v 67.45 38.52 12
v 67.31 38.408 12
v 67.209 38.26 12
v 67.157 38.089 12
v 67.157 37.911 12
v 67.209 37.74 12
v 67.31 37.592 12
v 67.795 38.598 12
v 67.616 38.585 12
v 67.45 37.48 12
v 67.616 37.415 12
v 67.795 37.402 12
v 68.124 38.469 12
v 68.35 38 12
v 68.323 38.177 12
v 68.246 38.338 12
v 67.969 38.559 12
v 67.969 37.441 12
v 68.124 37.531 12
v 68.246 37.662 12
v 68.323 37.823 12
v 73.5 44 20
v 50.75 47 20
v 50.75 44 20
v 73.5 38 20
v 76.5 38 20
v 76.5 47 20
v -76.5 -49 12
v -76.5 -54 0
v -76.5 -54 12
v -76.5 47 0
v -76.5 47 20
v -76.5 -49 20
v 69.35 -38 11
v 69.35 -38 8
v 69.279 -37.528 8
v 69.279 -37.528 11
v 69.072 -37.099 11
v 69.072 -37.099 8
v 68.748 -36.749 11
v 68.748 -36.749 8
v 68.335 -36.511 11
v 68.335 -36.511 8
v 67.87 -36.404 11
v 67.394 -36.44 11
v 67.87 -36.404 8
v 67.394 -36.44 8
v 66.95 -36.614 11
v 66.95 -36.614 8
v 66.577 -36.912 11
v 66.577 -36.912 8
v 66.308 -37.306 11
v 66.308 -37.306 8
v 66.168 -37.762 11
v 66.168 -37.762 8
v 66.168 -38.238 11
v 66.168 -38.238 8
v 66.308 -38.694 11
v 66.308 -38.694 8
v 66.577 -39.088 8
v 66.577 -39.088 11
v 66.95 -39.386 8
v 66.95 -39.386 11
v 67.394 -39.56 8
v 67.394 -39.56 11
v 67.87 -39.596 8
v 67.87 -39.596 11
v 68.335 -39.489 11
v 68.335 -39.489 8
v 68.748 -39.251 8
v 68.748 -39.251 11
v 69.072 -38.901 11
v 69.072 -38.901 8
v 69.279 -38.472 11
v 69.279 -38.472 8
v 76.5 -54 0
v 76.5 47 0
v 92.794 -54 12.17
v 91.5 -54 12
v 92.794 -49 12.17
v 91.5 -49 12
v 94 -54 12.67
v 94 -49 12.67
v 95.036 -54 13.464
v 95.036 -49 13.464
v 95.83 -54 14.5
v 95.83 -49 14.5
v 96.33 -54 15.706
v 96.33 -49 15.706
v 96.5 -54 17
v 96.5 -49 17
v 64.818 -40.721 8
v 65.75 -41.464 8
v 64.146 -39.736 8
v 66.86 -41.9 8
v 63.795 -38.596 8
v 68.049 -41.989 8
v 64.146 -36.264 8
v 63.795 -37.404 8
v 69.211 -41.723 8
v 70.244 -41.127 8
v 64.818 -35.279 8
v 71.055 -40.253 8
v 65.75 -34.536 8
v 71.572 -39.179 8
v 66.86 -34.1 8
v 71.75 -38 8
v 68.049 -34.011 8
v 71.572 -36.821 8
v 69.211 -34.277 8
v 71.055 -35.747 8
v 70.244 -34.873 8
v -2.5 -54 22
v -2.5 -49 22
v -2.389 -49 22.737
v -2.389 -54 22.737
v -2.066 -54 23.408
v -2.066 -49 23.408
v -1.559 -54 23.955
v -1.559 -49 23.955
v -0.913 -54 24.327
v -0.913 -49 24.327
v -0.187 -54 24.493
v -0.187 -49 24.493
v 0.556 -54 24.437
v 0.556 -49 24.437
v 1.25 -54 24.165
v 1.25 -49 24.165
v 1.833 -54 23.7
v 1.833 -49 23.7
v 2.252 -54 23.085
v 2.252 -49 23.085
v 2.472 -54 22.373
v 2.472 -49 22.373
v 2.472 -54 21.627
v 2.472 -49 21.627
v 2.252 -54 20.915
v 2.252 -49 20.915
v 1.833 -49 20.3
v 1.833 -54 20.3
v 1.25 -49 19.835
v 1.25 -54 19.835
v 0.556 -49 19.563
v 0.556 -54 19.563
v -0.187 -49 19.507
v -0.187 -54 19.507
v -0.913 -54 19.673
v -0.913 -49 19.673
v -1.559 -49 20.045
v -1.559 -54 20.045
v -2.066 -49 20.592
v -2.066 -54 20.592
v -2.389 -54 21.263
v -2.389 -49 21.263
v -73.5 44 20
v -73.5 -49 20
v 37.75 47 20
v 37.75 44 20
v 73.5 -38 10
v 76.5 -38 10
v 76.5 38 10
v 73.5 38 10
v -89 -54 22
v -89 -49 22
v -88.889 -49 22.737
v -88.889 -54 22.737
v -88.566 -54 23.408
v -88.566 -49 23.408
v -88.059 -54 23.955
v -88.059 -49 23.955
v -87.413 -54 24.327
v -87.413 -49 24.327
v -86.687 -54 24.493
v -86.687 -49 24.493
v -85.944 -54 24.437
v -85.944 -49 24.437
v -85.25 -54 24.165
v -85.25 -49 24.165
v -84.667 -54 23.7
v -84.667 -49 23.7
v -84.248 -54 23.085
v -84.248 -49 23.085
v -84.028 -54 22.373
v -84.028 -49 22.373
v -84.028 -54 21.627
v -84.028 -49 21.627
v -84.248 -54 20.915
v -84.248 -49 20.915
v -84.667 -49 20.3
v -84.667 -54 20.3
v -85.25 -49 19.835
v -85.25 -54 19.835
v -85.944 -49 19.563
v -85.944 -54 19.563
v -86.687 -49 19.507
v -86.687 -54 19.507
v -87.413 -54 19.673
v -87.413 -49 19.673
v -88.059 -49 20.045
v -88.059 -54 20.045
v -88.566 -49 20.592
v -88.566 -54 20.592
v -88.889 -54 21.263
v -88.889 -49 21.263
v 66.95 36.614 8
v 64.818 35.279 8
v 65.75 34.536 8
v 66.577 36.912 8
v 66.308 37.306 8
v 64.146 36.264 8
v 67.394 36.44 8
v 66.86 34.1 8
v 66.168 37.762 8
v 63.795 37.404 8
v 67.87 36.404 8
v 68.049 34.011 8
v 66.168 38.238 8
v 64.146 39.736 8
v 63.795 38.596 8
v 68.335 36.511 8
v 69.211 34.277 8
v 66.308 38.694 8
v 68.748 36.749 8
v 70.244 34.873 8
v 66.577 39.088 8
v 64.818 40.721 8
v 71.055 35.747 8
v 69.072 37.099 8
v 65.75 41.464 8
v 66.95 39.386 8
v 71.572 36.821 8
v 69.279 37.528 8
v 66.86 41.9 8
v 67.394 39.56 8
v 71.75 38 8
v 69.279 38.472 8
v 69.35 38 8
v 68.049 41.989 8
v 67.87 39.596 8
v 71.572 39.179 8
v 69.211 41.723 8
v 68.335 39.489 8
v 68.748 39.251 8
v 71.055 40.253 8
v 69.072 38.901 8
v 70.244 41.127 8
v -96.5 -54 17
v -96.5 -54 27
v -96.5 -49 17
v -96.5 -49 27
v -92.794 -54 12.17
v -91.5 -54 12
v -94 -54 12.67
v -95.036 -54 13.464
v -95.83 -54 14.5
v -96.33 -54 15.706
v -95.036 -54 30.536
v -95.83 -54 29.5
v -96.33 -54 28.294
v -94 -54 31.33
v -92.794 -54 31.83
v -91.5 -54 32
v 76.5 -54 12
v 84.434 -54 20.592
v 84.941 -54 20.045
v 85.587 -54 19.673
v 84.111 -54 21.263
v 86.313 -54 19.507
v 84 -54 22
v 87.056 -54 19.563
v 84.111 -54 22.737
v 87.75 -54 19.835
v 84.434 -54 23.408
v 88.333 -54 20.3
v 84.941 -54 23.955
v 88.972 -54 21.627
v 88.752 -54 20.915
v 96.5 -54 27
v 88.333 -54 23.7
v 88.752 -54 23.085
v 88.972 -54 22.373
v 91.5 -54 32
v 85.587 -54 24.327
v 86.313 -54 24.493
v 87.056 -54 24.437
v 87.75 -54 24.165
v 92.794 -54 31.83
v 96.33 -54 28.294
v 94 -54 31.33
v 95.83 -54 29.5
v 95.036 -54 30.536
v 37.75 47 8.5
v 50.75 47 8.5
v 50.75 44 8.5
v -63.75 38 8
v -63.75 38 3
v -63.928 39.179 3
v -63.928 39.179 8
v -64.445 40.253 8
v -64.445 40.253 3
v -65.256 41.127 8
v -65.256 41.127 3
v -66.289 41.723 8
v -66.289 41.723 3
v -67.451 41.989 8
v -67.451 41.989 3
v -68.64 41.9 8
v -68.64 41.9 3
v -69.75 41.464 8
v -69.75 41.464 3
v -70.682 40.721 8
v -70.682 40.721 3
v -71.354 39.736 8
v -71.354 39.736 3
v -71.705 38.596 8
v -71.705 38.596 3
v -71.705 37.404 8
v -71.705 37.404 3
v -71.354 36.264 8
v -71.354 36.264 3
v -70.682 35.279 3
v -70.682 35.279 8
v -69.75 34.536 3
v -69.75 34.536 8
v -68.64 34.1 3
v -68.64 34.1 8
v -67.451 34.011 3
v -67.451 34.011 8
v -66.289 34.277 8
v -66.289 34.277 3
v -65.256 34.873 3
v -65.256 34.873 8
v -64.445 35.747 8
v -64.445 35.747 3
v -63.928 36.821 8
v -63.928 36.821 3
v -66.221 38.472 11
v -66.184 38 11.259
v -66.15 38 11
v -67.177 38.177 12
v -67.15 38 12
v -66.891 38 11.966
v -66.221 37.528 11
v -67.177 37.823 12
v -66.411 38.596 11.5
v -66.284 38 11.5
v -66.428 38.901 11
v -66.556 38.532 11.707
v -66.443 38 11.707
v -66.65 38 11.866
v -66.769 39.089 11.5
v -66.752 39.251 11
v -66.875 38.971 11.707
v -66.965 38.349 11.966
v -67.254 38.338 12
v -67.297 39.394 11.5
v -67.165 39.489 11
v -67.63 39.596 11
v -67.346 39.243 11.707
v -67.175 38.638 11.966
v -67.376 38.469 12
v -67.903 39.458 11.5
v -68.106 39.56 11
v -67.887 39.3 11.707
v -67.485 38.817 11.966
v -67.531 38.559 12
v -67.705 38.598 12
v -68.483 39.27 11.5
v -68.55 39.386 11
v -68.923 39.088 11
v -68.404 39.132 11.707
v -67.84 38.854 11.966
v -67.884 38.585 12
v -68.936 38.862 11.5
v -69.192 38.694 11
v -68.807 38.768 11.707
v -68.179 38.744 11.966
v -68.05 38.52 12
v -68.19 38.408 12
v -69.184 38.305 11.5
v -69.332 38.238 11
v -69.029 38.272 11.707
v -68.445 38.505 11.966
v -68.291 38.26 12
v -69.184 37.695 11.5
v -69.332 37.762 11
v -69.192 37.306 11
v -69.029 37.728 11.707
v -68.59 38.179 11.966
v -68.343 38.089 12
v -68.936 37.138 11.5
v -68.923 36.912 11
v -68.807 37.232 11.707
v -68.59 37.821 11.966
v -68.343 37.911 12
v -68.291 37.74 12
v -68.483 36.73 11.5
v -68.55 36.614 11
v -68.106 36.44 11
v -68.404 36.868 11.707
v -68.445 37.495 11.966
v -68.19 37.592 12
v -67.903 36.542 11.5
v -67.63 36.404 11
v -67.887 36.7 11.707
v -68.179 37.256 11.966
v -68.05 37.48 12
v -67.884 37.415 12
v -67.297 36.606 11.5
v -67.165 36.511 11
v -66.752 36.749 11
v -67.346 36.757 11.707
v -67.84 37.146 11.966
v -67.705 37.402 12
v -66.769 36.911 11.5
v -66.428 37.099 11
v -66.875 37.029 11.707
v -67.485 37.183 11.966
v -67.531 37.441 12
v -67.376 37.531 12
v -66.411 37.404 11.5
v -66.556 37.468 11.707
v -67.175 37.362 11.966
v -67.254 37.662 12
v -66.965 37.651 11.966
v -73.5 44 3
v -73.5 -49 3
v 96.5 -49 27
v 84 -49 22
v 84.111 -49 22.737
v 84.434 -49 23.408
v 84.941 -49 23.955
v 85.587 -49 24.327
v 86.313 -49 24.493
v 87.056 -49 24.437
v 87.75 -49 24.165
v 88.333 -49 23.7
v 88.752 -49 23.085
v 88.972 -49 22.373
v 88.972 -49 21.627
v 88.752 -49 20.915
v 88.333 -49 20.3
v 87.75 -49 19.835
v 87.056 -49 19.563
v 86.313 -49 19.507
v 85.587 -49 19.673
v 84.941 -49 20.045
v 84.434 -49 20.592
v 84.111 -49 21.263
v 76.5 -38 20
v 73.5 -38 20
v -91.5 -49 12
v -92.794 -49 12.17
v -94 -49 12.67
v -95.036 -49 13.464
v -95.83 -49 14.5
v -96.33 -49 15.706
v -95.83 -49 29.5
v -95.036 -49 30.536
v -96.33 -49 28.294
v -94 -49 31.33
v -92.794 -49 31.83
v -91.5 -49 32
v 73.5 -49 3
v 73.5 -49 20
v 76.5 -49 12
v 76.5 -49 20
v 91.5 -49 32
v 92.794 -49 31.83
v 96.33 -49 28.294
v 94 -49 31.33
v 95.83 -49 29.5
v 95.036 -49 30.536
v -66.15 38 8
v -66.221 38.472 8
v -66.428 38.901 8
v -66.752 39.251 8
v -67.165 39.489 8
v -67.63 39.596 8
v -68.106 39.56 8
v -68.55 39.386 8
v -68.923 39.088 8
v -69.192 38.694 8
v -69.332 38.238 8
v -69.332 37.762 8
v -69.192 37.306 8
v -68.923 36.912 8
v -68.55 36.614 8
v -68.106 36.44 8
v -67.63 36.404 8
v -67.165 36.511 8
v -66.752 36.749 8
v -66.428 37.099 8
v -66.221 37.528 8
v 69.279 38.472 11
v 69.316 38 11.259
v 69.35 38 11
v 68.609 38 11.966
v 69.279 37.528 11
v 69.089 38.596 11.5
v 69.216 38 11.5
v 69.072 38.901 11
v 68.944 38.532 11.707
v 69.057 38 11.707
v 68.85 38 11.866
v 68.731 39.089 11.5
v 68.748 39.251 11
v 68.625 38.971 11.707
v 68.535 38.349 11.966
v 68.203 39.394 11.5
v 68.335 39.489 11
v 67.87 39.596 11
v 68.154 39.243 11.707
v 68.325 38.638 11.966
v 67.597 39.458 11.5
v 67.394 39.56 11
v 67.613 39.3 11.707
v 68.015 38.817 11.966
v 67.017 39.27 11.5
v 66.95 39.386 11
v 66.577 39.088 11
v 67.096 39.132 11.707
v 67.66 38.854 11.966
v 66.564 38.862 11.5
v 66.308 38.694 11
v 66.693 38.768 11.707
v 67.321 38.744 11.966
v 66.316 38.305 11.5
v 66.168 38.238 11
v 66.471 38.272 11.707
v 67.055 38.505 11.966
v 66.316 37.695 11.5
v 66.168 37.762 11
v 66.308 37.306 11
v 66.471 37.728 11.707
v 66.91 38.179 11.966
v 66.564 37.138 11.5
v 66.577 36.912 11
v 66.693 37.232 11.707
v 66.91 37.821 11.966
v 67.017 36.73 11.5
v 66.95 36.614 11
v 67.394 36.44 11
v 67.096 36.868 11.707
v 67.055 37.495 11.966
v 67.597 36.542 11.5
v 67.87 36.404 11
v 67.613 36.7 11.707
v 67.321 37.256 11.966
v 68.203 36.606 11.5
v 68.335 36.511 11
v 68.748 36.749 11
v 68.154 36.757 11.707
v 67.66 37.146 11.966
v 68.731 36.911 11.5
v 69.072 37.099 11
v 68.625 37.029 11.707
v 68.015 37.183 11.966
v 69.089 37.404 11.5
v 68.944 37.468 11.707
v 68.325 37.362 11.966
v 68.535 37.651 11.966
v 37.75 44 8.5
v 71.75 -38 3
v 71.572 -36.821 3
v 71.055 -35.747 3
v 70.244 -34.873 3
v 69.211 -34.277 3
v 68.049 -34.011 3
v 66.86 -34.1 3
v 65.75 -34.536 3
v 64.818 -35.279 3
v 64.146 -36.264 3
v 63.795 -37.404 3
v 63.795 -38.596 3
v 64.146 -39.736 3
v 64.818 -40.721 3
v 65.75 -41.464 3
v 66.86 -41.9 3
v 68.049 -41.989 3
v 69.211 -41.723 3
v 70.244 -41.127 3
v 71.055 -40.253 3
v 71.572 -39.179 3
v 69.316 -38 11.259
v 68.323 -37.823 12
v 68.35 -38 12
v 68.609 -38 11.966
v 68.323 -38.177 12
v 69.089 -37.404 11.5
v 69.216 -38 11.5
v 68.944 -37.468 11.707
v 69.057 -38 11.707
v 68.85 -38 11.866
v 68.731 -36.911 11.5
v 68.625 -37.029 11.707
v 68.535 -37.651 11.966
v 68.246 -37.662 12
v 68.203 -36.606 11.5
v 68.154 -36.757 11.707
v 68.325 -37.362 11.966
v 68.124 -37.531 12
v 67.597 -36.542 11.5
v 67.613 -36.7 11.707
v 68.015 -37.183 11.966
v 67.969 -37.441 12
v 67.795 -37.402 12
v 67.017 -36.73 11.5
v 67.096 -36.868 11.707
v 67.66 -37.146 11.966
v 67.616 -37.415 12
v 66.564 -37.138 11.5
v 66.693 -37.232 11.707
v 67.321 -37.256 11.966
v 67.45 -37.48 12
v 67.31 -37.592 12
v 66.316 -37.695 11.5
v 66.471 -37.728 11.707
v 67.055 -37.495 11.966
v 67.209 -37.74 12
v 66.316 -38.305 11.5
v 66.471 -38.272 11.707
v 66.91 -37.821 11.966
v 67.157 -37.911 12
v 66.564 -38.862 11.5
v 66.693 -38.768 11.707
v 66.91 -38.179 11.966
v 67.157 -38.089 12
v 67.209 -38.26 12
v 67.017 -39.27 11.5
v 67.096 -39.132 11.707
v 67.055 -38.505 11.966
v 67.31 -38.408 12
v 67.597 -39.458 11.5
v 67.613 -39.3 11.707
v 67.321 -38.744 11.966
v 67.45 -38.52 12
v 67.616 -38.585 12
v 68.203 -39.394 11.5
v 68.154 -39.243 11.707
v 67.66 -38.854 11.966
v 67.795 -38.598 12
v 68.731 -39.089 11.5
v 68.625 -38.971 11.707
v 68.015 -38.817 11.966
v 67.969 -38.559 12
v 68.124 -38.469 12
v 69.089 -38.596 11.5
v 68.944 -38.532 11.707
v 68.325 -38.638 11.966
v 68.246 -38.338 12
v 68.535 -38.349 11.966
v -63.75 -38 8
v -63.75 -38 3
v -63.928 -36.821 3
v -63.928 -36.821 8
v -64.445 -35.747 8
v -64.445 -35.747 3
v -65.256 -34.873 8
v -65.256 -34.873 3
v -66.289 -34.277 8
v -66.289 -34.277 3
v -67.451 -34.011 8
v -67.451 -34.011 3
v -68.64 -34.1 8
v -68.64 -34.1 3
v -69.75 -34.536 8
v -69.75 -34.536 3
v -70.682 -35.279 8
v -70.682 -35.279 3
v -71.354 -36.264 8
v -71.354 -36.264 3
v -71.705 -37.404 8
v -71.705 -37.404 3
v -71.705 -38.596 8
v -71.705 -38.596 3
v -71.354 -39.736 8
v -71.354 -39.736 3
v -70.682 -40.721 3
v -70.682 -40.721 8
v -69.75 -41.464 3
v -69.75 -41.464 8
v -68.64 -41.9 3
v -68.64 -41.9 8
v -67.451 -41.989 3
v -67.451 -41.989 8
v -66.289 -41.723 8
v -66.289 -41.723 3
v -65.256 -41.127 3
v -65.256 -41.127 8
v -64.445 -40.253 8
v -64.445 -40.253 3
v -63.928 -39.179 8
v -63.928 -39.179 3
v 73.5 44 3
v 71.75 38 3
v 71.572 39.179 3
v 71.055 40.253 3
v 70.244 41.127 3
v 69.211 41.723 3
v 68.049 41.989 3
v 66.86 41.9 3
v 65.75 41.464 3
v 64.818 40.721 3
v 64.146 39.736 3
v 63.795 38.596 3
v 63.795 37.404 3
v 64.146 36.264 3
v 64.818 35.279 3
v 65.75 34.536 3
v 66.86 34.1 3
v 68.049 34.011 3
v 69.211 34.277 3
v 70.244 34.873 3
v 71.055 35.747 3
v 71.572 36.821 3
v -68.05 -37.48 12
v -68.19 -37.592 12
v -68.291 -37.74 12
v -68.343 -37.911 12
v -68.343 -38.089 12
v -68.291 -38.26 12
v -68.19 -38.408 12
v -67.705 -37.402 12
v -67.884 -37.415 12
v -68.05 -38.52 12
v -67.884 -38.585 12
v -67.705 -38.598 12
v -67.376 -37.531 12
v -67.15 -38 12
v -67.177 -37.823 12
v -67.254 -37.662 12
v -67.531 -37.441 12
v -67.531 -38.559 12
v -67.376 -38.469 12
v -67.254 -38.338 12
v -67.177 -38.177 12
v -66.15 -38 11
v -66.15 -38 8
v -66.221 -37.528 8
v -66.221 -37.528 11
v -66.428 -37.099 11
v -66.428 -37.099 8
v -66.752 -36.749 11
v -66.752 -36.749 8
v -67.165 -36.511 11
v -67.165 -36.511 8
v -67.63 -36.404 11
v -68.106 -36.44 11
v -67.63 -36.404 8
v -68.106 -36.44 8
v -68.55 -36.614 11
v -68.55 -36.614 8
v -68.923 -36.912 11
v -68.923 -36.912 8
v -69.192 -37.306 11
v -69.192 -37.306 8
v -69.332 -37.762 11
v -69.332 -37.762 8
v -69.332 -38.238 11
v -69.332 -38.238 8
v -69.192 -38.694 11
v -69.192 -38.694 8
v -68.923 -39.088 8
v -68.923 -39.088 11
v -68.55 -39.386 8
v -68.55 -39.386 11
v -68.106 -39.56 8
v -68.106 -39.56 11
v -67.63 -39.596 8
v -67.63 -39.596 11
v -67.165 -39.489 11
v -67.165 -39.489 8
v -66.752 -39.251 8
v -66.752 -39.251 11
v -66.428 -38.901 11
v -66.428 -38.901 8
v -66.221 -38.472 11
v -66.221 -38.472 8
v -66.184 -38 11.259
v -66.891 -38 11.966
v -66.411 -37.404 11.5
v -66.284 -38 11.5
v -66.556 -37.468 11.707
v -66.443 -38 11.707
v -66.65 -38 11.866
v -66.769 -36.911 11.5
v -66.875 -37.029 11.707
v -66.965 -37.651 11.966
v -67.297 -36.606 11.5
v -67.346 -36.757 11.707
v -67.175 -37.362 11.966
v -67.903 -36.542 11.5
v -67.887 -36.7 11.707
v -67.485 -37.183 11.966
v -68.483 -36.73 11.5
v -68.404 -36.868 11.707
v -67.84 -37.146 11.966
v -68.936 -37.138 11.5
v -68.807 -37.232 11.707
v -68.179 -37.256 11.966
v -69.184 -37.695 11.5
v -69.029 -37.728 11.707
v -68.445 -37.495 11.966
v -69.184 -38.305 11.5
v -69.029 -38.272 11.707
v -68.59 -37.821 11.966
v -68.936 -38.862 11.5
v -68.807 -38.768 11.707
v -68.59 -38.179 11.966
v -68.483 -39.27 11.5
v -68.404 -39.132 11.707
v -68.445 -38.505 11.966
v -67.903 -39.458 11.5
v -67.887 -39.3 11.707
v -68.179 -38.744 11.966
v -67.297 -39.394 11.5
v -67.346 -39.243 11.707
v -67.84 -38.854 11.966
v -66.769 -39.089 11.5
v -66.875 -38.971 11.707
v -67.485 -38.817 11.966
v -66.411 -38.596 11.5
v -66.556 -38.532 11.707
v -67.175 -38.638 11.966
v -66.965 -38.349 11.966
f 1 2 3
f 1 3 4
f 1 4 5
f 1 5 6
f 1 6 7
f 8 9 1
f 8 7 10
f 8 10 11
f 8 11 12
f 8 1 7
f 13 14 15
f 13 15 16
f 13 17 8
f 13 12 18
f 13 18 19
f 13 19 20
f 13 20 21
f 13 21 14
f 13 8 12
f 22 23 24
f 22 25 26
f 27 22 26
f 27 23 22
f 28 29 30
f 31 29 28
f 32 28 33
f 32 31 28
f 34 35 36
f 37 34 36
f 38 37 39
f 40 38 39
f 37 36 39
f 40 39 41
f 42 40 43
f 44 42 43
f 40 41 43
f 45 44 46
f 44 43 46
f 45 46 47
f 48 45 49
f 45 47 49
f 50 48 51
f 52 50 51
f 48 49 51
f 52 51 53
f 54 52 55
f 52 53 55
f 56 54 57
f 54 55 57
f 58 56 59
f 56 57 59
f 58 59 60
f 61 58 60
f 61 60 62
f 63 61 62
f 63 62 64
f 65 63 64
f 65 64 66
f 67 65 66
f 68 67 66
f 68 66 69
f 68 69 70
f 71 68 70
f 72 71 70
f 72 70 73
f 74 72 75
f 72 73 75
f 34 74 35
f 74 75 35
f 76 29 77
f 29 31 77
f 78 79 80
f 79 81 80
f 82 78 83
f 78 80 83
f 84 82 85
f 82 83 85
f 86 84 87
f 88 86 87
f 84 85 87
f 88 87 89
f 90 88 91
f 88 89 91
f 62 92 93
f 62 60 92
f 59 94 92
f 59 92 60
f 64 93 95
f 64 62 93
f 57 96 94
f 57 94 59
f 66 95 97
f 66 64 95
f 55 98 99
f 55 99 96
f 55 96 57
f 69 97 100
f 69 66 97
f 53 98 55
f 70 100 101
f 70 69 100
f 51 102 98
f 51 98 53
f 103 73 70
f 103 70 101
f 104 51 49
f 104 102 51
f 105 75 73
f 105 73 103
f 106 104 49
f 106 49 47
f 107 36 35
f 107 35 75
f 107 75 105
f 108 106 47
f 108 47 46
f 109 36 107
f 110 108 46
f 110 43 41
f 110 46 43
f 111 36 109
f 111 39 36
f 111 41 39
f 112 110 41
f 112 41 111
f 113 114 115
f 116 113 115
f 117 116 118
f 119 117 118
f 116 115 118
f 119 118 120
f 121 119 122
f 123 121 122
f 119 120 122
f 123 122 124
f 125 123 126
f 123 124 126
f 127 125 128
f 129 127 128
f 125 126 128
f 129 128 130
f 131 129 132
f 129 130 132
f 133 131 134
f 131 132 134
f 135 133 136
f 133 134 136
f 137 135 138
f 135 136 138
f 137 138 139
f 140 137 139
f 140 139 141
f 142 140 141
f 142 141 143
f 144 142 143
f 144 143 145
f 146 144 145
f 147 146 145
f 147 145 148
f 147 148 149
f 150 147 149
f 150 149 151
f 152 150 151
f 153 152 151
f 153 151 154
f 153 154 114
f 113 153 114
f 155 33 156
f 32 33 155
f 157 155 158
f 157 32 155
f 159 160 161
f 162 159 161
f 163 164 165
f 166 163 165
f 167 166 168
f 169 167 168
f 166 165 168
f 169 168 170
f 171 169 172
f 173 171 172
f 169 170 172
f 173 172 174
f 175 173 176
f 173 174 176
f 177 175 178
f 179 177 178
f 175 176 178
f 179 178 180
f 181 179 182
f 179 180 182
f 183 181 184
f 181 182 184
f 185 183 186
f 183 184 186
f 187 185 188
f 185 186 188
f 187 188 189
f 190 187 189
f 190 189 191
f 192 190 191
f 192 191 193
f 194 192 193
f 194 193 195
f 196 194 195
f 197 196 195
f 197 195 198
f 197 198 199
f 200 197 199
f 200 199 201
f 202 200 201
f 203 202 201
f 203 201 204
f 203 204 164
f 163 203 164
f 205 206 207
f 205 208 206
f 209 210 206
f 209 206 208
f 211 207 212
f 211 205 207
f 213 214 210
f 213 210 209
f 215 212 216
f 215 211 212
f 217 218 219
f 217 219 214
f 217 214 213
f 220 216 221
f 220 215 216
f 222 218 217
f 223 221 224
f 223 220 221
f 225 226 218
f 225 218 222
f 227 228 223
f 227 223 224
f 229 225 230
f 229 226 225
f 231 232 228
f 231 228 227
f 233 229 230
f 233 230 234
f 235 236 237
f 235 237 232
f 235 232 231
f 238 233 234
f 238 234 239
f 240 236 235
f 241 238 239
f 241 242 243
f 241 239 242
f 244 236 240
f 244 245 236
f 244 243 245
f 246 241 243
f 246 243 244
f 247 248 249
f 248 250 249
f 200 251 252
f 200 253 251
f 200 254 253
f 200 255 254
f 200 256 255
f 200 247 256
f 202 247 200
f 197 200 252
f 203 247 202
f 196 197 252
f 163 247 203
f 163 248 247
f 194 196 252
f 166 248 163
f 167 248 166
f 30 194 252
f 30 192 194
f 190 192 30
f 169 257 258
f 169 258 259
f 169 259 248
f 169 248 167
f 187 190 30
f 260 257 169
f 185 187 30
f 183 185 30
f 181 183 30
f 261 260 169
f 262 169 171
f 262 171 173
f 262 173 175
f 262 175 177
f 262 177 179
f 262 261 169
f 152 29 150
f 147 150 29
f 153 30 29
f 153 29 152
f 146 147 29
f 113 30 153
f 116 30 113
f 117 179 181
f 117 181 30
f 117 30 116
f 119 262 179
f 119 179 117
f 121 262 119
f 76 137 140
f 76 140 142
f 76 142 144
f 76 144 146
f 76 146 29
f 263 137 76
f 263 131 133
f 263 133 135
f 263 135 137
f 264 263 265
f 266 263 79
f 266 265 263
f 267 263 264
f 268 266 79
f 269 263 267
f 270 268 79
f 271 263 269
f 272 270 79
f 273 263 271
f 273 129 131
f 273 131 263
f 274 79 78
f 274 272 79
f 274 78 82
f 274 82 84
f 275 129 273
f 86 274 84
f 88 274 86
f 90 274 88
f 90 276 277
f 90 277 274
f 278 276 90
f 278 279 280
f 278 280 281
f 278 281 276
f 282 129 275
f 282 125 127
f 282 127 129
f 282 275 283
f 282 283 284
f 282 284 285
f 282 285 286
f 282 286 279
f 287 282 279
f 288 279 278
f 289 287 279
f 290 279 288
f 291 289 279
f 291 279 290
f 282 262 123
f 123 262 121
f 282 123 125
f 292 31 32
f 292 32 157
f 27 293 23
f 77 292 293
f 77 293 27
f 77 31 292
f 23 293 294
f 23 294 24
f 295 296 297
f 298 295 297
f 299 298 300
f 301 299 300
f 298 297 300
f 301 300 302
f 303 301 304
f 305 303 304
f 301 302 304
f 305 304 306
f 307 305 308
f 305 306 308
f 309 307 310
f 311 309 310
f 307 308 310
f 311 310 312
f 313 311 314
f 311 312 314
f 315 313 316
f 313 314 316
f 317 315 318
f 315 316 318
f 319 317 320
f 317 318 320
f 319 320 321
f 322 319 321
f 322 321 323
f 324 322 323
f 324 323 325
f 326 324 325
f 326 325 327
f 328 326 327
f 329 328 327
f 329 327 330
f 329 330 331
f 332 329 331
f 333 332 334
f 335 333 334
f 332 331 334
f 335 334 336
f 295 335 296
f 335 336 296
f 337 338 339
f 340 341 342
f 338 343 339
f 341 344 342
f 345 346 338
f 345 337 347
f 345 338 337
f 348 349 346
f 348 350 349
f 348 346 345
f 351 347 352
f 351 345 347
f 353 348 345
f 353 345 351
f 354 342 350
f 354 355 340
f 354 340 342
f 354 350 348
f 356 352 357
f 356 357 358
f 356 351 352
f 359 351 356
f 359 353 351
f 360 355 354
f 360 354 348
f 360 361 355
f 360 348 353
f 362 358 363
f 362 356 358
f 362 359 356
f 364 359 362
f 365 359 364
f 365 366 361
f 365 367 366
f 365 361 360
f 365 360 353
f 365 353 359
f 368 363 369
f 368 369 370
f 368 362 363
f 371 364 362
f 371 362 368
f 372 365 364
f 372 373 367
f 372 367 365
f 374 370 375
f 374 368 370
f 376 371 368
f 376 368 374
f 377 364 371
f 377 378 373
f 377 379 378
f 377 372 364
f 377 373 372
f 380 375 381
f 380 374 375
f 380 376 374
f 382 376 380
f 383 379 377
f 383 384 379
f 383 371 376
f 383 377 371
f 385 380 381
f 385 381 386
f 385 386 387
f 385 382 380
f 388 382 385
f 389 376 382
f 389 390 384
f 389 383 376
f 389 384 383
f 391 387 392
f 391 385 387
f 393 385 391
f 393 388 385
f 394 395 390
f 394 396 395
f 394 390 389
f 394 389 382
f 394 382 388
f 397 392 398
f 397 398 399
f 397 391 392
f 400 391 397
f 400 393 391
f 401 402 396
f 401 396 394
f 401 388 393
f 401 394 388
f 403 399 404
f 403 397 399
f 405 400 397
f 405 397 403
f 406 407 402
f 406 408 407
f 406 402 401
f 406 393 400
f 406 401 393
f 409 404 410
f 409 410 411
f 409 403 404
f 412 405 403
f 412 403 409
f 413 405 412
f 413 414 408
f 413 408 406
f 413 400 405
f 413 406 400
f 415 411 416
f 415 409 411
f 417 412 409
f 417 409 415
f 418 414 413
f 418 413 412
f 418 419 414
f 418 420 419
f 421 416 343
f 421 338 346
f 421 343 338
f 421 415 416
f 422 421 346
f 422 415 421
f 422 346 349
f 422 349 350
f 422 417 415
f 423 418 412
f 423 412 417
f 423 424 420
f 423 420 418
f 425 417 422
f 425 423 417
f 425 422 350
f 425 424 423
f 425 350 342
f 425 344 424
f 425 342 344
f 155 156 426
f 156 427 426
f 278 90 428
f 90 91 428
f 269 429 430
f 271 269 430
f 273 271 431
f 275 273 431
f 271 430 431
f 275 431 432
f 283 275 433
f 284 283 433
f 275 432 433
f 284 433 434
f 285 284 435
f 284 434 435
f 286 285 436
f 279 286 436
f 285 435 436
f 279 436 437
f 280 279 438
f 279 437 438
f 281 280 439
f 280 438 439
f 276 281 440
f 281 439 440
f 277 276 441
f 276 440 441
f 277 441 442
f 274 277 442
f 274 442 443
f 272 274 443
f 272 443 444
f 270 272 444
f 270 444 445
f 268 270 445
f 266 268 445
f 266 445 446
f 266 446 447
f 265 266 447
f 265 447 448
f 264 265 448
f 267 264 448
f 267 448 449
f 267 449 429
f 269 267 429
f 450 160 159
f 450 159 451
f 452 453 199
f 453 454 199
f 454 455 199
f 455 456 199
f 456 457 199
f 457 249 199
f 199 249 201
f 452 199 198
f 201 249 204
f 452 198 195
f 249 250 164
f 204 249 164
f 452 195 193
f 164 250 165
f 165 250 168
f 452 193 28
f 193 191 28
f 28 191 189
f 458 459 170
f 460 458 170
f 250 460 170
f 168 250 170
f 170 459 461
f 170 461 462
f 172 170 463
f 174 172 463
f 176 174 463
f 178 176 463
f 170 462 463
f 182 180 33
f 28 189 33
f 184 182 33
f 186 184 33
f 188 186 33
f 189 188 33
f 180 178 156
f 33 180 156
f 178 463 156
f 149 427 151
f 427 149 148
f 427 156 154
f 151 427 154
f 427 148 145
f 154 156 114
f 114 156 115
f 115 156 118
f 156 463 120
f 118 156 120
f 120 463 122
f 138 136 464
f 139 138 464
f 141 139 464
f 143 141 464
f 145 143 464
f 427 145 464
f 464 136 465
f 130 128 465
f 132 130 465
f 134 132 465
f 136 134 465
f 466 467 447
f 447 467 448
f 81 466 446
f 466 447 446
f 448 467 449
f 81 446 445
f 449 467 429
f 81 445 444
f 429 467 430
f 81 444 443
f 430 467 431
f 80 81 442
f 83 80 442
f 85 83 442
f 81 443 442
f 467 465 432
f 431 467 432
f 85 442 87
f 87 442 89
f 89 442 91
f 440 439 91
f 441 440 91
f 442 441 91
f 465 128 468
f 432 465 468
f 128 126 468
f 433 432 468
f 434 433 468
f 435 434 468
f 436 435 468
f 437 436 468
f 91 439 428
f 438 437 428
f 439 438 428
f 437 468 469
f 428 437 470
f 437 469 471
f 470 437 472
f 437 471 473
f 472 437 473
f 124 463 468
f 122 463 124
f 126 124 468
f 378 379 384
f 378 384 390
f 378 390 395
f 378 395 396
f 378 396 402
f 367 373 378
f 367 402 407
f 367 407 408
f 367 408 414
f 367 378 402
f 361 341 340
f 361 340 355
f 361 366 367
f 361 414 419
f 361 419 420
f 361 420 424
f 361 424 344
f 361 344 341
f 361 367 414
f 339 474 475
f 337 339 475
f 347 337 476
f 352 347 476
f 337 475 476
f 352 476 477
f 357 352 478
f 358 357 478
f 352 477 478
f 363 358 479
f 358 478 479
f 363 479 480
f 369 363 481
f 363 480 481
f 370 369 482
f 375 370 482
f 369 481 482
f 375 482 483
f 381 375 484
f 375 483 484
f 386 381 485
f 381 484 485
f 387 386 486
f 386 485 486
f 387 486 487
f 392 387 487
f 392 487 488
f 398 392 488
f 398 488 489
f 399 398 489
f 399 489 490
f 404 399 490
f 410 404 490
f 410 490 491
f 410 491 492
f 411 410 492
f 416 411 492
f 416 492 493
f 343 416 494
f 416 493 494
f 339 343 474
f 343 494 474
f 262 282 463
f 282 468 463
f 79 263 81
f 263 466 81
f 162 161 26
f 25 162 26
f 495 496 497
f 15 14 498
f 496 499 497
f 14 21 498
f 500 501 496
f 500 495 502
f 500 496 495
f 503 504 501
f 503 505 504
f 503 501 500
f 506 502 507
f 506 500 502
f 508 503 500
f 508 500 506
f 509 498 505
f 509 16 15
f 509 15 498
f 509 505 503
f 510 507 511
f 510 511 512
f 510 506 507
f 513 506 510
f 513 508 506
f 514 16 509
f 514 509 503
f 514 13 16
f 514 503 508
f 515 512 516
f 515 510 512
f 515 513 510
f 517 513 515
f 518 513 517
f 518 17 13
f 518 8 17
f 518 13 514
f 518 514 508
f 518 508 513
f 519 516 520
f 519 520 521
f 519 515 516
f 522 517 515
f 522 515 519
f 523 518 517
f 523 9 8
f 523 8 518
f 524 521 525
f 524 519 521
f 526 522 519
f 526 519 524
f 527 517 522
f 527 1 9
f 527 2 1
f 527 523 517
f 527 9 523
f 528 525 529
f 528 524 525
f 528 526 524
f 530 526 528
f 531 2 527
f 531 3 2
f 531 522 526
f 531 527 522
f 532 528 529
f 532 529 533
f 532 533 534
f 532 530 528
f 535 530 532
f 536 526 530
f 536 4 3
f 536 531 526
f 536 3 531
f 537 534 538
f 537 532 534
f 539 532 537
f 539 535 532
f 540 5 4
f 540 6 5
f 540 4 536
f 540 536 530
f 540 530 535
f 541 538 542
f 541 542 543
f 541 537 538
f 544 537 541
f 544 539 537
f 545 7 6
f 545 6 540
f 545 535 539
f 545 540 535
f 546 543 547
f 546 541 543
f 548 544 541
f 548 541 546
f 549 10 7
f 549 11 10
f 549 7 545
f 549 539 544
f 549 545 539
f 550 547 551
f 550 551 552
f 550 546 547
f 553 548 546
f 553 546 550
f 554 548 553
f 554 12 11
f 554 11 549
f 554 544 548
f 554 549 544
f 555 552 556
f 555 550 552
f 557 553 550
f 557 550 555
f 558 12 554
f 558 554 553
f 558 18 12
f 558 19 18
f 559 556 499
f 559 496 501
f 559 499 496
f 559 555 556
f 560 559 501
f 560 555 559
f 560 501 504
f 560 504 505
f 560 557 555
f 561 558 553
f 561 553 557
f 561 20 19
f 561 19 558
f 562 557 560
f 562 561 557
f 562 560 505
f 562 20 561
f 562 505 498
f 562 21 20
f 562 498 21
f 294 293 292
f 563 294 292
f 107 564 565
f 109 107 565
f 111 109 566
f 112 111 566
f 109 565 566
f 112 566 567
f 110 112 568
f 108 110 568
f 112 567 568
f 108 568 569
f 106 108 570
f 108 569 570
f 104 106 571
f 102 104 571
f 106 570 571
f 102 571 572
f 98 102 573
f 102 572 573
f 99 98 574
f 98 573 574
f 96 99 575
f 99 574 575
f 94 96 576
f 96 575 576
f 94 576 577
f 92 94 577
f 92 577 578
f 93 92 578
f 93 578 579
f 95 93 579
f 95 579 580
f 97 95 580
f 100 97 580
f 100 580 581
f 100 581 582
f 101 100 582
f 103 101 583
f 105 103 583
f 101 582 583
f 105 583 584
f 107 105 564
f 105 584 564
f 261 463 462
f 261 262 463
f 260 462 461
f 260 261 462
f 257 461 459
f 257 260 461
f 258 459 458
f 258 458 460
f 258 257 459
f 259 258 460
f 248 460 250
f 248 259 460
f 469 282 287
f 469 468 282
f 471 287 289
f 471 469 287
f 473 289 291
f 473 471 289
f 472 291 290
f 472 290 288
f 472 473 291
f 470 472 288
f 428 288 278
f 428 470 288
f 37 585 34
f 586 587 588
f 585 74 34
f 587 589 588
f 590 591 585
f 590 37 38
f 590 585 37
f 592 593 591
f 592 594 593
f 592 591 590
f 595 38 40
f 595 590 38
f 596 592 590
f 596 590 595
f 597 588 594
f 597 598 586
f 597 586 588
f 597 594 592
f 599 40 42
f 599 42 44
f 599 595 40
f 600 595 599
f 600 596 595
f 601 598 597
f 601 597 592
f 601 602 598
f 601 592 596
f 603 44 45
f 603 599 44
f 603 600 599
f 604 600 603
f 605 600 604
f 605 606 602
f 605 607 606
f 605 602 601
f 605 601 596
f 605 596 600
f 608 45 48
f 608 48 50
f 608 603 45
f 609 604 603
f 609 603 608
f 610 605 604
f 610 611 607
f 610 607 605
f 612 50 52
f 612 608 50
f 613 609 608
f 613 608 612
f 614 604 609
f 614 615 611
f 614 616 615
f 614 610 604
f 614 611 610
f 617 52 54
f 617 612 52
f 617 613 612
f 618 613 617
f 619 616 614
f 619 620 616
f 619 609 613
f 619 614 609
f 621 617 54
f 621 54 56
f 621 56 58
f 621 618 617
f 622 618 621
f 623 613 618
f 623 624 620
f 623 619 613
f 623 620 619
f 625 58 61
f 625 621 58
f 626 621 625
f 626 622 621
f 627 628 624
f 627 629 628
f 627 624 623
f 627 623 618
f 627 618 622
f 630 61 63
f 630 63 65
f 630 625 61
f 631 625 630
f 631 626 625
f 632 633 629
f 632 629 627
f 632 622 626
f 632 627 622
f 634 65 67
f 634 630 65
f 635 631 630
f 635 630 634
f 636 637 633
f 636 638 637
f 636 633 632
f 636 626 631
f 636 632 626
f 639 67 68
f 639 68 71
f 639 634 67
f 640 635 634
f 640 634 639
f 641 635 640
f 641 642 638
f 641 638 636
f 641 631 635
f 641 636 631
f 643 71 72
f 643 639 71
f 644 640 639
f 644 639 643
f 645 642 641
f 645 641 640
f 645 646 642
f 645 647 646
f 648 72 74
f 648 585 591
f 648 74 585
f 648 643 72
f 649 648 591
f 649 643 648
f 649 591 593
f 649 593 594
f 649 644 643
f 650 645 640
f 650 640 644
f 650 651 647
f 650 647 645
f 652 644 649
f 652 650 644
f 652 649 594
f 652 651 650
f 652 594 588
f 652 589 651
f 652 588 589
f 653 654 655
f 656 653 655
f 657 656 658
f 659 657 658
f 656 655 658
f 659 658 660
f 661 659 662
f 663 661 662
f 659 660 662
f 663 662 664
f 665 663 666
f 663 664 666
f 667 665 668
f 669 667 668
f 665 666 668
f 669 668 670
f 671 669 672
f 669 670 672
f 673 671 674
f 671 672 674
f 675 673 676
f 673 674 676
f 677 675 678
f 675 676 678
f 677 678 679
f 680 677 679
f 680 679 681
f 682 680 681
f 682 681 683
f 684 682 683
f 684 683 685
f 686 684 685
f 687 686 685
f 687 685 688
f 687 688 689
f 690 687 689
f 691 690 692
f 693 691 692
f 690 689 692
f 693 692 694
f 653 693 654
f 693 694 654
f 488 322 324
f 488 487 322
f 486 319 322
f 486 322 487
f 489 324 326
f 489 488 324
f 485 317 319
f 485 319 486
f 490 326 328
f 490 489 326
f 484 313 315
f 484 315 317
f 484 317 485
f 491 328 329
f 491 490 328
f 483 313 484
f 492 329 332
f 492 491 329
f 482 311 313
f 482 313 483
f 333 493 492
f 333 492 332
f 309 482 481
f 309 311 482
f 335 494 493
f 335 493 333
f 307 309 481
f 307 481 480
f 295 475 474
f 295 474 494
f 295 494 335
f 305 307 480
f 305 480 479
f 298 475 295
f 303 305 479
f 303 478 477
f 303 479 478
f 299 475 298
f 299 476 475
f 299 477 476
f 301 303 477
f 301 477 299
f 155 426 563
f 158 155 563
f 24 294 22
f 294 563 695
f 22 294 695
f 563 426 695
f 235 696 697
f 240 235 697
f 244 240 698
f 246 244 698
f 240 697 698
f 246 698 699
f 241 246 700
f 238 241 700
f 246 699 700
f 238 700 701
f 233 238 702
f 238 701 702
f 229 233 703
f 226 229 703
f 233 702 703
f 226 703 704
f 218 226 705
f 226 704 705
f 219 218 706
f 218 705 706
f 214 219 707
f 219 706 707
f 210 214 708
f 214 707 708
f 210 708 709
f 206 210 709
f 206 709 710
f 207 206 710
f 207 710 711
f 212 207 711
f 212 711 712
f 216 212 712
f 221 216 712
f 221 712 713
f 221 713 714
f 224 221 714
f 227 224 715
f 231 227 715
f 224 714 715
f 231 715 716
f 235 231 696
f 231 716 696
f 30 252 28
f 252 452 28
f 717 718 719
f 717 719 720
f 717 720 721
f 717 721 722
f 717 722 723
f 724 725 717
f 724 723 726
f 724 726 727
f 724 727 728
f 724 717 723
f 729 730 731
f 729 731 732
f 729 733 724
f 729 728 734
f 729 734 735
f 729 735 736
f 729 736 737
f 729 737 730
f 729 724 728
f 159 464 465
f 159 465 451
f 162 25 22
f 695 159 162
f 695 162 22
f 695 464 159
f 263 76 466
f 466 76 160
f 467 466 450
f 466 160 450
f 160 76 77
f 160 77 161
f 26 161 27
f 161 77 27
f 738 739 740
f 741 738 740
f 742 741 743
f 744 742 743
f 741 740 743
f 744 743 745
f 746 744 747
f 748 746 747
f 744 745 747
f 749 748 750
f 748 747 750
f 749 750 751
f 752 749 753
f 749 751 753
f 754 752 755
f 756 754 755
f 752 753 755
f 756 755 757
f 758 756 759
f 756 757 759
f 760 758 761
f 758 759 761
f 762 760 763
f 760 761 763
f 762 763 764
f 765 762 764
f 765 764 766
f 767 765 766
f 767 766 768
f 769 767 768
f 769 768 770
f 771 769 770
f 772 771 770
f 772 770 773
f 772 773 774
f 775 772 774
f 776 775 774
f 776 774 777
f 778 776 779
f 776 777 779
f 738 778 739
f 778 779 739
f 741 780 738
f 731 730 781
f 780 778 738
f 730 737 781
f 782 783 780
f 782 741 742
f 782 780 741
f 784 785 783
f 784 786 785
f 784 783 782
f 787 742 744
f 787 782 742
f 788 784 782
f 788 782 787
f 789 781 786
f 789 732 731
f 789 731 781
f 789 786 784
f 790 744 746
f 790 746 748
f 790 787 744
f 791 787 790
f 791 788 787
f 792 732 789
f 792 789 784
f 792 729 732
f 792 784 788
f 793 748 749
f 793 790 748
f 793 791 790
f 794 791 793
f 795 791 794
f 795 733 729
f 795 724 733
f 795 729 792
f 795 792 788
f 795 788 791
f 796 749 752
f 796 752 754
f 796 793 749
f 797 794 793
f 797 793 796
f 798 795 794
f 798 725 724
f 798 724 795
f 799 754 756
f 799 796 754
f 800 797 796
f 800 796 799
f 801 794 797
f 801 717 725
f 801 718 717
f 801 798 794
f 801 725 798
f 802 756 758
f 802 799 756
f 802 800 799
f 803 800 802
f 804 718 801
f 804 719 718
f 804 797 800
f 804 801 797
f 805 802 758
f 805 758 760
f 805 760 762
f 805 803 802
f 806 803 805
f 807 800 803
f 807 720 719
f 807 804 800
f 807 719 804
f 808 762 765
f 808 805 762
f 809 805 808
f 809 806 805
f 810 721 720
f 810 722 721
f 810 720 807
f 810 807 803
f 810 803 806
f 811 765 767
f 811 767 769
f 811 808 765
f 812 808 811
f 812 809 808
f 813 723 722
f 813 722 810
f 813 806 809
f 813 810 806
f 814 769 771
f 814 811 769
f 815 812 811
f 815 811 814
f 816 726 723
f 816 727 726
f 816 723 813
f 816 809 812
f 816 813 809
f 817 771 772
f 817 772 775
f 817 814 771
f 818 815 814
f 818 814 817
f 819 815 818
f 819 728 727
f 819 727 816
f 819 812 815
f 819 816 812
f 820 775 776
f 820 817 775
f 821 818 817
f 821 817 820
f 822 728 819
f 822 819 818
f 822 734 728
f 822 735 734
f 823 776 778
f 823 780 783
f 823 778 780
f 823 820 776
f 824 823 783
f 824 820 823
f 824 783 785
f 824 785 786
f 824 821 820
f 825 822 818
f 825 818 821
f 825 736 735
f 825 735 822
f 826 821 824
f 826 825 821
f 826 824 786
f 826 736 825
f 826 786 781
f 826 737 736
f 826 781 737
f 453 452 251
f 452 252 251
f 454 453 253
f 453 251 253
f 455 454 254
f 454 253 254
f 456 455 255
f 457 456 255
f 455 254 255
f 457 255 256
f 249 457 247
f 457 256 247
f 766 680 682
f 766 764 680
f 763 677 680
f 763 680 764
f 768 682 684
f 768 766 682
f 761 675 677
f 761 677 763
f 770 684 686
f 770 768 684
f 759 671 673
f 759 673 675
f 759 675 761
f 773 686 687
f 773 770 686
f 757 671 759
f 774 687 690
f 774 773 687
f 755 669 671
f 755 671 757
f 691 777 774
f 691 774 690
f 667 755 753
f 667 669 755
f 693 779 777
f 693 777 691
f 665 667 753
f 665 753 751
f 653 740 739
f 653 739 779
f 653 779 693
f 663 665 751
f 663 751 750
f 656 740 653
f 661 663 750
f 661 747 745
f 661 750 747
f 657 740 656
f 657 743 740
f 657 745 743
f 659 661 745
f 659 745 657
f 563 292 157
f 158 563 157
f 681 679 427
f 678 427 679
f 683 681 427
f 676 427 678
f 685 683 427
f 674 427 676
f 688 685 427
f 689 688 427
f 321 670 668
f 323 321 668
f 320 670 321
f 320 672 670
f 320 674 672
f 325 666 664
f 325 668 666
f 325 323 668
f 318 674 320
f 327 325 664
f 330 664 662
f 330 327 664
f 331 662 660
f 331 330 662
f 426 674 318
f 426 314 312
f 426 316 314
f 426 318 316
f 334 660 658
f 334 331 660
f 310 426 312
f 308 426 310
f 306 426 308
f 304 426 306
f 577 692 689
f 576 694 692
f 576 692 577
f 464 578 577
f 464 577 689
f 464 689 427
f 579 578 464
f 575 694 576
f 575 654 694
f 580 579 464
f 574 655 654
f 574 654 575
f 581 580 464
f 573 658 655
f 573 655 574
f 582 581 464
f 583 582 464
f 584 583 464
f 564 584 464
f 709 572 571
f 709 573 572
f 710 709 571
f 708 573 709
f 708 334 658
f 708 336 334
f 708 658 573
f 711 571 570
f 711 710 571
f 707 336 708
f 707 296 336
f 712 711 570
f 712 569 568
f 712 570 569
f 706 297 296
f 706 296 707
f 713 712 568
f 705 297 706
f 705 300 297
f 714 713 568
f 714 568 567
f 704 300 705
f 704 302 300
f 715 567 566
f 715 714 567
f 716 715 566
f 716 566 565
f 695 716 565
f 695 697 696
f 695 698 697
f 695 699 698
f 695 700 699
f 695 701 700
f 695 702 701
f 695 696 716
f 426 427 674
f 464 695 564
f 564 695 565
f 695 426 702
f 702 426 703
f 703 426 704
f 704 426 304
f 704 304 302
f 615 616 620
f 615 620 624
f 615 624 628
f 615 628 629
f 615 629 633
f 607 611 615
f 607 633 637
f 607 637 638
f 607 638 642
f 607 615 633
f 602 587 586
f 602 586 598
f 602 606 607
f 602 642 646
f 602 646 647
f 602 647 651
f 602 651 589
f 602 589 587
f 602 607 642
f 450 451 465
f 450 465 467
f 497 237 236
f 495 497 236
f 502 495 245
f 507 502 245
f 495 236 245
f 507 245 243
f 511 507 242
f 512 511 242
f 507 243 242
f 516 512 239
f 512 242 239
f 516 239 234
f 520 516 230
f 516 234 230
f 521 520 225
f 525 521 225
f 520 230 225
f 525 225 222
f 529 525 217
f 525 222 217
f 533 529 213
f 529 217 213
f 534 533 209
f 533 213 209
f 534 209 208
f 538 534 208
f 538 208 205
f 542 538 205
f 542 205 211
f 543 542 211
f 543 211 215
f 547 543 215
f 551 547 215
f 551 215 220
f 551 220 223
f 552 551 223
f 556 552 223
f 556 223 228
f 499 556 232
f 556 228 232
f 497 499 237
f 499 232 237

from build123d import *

# Parameters (mm, degrees)
F0_W          = 153
F0_H          = 99
F0_R          = 4
F1_DEPTH      = 20
F2_T          = -3
F3_R          = 4
F4_DEPTH      = 5
F5_R          = 1.6
F6_DEPTH      = 4
F7_R          = 1
F8_W          = 153
F8_H          = 8
F8_H_2        = 12
F9_DEPTH      = 3
F9_DEPTH_BACK = 2
F10_R         = 5
F11_W         = 13
F11_H         = 11.5
F12_DEPTH     = 3
F14_W         = 76
F14_H         = 10
F15_DEPTH     = 3
F17_D         = 5
F17_DEPTH     = 6
F17_TIP       = 1.5021515476


with BuildPart() as f1:
    # F0 (on Top) → F1 (new body)
    with BuildSketch(Plane.XY):
        with Locations((0, -2.5)):
            Rectangle(F0_W, F0_H)
        with Locations((-67.75, -38)):
            Circle(F0_R, mode=Mode.SUBTRACT)
        with Locations((67.75, -38)):
            Circle(F0_R, mode=Mode.SUBTRACT)
        with Locations((-67.75, 38)):
            Circle(F0_R, mode=Mode.SUBTRACT)
        with Locations((67.75, 38)):
            Circle(F0_R, mode=Mode.SUBTRACT)
        with Locations((-67.75, 38)):
            Circle(F0_R)
        with Locations((-67.75, -38)):
            Circle(F0_R)
        with Locations((67.75, -38)):
            Circle(F0_R)
        with Locations((67.75, 38)):
            Circle(F0_R)
    extrude(amount=F1_DEPTH)

    # F2
    f2_openings = [f1.faces().sort_by_distance(p)[0] for p in [
        (0, -2.5, 20),
    ]]
    offset(amount=F2_T, openings=f2_openings)

    # F3 (on face) → F4 (join)
    with BuildSketch(Plane.XY.offset(3)):
        with Locations((-67.75, 38)):
            Circle(F3_R)
        with Locations((-67.75, -38)):
            Circle(F3_R)
        with Locations((67.75, 38)):
            Circle(F3_R)
        with Locations((67.75, -38)):
            Circle(F3_R)
    extrude(amount=F4_DEPTH)

    # F5 (on face) → F6 (join)
    with BuildSketch(Plane.XY.offset(8)):
        with Locations((-67.75, -38)):
            Circle(F5_R)
        with Locations((-67.75, 38)):
            Circle(F5_R)
        with Locations((67.75, 38)):
            Circle(F5_R)
        with Locations((67.75, -38)):
            Circle(F5_R)
    extrude(amount=F6_DEPTH)

    # F7
    f7_edges = [f1.edges().sort_by_distance(p)[0] for p in [
        (-69.35, 38, 12),
        (-69.35, -38, 12),
        (66.15, 38, 12),
        (66.15, -38, 12),
    ]]
    fillet(f7_edges, radius=F7_R)

    # F8 (on face) → F9 (join, two sides)
    with BuildSketch(Plane.XZ.offset(52)) as f9_sk:
        Polygon((96.5, 32), (-96.5, 32), (-96.5, 12), (-76.5, 12), (-76.5, 20), (76.5, 20), (76.5, 12), (96.5, 12), align=None)
        with Locations((0, 16)):
            Rectangle(F8_W, F8_H)
        with Locations((0, 6)):
            Rectangle(F8_W, F8_H_2)
    extrude(amount=-F9_DEPTH)
    extrude(f9_sk.sketch, amount=F9_DEPTH_BACK)

    # F10
    f10_edges = [f1.edges().sort_by_distance(p)[0] for p in [
        (-96.5, -51.5, 32),
        (-96.5, -51.5, 12),
        (96.5, -51.5, 32),
        (96.5, -51.5, 12),
    ]]
    fillet(f10_edges, radius=F10_R)

    # F11 (on face) → F12 (cut, through all)
    with BuildSketch(Plane(origin=(0, 47, 0), x_dir=(-1, 0, 0), z_dir=(0, 1, 0))):
        with Locations((-44.25, 14.25)):
            Rectangle(F11_W, F11_H)
    extrude(amount=-F12_DEPTH, mode=Mode.SUBTRACT)

    # F14 (on face) → F15 (cut, through all)
    with BuildSketch(Plane.YZ.offset(76.5)):
        with Locations((0, 15)):
            Rectangle(F14_W, F14_H)
    extrude(amount=-F15_DEPTH, mode=Mode.SUBTRACT)

    # F17
    with Locations(Plane.XZ.offset(54)):
        with Locations((-86.5, 22), (0, 22), (86.5, 22)):
            Hole(F17_D / 2, depth=F17_DEPTH)
            with Locations((0, 0, -(F17_DEPTH + F17_TIP / 2))):  # 118° drill point
                Cone(0, F17_D / 2, F17_TIP, mode=Mode.SUBTRACT)


solid = f1.part
